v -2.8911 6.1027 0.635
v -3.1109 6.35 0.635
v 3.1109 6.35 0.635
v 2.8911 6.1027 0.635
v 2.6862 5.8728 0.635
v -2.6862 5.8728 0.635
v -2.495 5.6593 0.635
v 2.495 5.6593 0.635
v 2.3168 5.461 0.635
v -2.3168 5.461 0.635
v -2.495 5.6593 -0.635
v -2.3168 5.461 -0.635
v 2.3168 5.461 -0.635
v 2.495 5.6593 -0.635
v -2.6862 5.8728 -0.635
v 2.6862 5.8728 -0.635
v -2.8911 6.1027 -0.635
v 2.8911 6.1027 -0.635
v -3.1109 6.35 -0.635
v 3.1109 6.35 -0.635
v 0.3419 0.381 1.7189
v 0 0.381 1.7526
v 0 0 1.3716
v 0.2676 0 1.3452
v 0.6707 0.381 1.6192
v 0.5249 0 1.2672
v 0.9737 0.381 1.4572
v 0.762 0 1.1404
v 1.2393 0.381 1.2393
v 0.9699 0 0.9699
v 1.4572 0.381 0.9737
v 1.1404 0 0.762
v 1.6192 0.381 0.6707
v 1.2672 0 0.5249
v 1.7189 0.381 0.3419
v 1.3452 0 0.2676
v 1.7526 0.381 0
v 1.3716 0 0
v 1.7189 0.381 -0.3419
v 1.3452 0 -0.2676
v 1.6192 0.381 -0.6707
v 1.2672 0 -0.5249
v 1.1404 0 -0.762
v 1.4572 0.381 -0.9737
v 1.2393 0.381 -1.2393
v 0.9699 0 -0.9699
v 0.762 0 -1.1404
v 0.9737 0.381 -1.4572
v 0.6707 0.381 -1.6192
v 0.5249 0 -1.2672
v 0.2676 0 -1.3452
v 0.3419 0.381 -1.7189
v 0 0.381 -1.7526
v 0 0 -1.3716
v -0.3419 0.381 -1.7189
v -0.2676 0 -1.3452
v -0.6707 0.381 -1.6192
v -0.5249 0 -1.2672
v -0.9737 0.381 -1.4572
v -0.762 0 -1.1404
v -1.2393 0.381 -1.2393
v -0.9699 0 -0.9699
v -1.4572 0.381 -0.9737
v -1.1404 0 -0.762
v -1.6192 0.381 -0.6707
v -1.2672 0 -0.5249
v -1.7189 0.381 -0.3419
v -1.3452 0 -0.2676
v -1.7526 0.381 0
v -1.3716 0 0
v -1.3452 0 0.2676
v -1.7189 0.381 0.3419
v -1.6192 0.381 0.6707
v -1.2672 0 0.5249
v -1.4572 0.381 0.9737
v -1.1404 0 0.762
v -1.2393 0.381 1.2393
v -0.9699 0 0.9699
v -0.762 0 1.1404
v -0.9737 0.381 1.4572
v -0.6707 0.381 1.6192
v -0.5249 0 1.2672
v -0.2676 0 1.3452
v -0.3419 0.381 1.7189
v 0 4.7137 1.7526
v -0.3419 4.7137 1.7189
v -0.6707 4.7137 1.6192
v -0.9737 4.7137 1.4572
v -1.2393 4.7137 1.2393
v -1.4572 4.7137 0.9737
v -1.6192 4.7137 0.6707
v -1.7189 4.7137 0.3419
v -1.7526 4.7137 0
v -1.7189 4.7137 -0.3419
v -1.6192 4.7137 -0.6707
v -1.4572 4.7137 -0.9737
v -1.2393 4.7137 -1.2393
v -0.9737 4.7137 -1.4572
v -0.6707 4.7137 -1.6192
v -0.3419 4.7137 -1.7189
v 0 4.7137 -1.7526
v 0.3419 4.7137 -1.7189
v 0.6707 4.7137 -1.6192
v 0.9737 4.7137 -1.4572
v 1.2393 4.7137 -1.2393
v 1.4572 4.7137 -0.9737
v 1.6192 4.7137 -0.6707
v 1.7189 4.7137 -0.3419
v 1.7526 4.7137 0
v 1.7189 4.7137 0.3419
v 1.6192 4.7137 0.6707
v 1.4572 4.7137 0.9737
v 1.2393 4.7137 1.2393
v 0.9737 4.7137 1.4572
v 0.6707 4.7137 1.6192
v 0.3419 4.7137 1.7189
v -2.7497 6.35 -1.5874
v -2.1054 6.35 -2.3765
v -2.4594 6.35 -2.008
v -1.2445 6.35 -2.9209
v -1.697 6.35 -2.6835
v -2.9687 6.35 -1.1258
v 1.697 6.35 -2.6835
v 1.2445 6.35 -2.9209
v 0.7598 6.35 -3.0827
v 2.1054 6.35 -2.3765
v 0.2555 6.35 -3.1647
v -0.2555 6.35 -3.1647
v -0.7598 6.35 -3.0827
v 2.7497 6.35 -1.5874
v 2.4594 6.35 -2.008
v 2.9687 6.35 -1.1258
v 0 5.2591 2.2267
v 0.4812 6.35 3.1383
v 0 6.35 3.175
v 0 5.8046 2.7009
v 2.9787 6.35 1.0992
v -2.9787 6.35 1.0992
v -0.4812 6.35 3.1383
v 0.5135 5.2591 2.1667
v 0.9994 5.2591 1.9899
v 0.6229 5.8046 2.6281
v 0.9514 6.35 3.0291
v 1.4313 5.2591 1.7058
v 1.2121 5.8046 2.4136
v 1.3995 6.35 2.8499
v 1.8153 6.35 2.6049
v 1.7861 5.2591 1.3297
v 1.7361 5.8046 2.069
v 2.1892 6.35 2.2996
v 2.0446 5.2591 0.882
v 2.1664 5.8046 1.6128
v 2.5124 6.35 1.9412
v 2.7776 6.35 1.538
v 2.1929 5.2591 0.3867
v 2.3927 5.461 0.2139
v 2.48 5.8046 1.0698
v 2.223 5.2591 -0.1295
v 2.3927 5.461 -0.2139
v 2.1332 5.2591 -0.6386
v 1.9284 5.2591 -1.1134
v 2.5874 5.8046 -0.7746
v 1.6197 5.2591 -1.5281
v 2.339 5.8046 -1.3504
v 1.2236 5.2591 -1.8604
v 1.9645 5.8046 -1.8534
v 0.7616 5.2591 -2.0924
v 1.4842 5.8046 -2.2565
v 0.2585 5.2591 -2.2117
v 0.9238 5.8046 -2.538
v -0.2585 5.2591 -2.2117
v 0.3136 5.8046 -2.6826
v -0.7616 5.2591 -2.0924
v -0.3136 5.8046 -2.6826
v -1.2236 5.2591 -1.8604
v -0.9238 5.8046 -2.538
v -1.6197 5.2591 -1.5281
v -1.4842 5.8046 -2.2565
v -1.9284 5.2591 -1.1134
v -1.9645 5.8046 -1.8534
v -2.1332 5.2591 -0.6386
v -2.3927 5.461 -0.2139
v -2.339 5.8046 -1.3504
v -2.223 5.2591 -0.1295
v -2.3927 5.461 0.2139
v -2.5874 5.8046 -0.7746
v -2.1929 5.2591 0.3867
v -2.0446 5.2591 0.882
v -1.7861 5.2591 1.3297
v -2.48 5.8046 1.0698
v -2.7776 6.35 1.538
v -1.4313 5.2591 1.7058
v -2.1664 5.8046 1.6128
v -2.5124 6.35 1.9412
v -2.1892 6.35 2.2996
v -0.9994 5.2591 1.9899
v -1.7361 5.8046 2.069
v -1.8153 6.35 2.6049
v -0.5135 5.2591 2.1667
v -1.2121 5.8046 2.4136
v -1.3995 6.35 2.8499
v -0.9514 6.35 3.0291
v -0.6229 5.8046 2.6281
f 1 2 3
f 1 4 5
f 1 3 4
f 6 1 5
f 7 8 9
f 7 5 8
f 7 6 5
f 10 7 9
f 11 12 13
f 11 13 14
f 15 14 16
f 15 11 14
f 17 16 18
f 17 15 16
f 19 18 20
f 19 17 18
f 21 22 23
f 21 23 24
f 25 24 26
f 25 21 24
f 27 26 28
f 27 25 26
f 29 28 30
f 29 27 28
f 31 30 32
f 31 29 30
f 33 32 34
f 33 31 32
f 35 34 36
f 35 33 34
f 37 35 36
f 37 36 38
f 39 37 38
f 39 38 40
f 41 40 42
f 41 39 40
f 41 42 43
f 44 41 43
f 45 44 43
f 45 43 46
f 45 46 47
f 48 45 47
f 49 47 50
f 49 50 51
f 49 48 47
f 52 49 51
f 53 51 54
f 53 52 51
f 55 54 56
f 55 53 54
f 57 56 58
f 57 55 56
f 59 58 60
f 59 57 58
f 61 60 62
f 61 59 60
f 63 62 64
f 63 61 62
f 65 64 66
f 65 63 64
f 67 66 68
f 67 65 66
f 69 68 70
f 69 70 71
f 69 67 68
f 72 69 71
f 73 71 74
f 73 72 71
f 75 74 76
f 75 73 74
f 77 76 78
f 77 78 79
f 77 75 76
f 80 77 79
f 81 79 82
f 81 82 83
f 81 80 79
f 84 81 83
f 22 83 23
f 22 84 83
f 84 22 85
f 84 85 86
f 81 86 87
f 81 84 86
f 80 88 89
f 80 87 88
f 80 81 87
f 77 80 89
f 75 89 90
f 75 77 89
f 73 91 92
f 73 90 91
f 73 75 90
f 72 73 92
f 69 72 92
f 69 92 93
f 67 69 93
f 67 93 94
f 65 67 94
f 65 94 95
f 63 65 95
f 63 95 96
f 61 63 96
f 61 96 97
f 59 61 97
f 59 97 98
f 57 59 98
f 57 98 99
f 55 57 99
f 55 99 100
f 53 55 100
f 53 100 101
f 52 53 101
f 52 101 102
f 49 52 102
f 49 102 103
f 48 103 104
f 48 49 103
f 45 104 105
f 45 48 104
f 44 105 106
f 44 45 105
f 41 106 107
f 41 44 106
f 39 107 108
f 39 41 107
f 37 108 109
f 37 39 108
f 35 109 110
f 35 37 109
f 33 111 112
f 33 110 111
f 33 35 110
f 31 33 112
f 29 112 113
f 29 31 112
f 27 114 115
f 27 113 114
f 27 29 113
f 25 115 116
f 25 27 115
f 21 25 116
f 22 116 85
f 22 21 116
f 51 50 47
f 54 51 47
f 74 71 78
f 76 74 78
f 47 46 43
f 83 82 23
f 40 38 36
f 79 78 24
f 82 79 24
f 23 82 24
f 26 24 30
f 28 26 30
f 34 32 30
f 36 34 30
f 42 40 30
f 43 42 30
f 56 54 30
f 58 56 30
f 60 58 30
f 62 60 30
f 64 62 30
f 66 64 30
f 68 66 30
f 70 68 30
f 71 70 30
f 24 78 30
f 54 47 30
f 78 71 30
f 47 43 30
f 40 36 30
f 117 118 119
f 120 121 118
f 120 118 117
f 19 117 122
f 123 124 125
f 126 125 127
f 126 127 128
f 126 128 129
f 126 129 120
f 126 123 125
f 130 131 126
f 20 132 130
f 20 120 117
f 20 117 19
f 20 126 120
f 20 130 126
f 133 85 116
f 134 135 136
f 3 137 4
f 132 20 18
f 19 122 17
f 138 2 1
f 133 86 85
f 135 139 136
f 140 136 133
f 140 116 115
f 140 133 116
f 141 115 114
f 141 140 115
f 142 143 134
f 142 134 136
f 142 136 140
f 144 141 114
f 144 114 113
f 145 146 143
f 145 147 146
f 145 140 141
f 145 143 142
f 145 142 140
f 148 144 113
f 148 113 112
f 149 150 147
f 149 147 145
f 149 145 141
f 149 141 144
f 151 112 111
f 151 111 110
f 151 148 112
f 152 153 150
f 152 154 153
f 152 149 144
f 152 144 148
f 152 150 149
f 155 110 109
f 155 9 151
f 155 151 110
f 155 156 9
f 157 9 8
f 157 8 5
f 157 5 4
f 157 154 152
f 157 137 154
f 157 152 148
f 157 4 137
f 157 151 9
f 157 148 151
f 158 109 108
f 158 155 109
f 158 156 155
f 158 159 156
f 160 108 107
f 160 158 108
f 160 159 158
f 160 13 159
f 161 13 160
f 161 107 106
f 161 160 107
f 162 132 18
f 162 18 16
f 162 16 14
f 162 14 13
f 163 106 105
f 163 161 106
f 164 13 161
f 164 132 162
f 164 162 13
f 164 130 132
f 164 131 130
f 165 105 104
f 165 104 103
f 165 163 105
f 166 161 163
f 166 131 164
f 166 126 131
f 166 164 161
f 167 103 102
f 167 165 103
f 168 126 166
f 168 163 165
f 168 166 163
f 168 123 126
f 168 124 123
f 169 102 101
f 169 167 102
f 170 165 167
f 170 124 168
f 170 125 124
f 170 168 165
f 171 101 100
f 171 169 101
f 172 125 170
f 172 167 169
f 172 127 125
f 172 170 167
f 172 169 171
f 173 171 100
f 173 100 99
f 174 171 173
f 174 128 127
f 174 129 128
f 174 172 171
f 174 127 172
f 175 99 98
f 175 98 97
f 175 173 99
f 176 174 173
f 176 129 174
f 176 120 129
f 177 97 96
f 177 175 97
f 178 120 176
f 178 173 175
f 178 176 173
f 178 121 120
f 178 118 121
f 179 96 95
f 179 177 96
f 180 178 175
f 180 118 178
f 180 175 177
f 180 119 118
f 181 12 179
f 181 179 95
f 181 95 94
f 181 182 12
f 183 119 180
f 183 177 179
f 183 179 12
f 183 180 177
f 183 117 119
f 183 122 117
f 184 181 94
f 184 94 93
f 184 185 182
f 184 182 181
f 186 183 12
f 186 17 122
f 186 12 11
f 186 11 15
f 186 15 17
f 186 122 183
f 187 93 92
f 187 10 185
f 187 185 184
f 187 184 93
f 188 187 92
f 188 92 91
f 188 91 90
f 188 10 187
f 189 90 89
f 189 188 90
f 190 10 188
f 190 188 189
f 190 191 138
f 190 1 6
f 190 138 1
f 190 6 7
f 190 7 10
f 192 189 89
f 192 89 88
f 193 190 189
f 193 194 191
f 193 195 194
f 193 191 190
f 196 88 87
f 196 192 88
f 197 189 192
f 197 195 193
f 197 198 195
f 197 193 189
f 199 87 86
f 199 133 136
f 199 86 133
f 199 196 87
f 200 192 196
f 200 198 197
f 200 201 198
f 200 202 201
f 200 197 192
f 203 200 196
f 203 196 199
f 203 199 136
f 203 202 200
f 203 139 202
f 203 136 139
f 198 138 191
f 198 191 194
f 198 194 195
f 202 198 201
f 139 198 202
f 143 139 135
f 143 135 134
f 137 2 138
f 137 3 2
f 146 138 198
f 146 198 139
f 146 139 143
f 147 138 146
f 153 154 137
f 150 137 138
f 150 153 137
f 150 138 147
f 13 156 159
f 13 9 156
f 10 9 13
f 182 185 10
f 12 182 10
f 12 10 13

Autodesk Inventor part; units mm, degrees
ref_plane "YZ Plane" through (0, 0, 0) normal (1, 0, 0) x (0, 1, 0)
ref_plane "XZ Plane" through (0, 0, 0) normal (0, 1, 0) x (-1, 0, 0)
ref_plane "XY Plane" through (0, 0, 0) normal (0, 0, 1) x (1, 0, 0)
sketch "Sketch1" plane through (0, 0, 0) normal (1, 0, 0) x (0, 1, 0)
  line L0 (6.35, 0) -> (6.35, 3.175)
  line L1 (6.35, 3.175) -> (4.7137, 1.7526)
  line L2 (4.7137, 1.7526) -> (0, 1.7526)
  line L3 (0, 1.7526) -> (0, 0)
  line L4 (0, 0) -> (6.35, 0)
  line L5 (6.35, 0) -> (6.35, -3.175) construction
  line L6 (6.35, -3.175) -> (4.7137, -1.7526) construction
  line L7 (4.7137, -1.7526) -> (0, -1.7526) construction
  line L8 (0, -1.7526) -> (0, 0) construction
  dimension "d0" = 6.35
  dimension "d1" = 3.5052
  dimension "d2" = 82
  dimension "d3" = 6.35
revolve "Revolution1" add sketch "Sketch1" angle 360 about axis through (0, 0, 0) along (0, 1, 0)
sketch "Sketch2" plane through (0, 0, 0) normal (1, 0, 0) x (0, 1, 0)
  line L0 (4.7137, -1.7526) -> (4.7137, 1.7526) construction
  line L1 (6.35, -3.175) -> (6.35, 3.175) construction
  line L2 (6.35, -3.175) -> (6.35, 3.175) projected
  line L3 (6.35, 0.635) -> (5.461, 0.635)
  line L4 (5.461, 0.635) -> (5.461, -0.635)
  line L5 (5.461, -0.635) -> (6.35, -0.635)
  line L6 (6.35, -0.635) -> (6.35, 0.635)
  line L7 (6.35, 0) -> (4.7137, 0) construction
  point P0 (0, 0)
  dimension "d5" = 1.27
  dimension "d6" = 0.889
extrude "Extrusion1" cut sketch "Sketch2" along normal through all both and the other way through all
chamfer "Chamfer1" distance 0.381 angle 45 1 edges at (0, 0, -1.7526)
thread "Thread1" size "6-32 UNC" class "2A" standard "ANSI Unified Screw Threads" full length
properties part number "6-32x0.25 Slotted Flathead" material "Stainless Steel, 440C"
